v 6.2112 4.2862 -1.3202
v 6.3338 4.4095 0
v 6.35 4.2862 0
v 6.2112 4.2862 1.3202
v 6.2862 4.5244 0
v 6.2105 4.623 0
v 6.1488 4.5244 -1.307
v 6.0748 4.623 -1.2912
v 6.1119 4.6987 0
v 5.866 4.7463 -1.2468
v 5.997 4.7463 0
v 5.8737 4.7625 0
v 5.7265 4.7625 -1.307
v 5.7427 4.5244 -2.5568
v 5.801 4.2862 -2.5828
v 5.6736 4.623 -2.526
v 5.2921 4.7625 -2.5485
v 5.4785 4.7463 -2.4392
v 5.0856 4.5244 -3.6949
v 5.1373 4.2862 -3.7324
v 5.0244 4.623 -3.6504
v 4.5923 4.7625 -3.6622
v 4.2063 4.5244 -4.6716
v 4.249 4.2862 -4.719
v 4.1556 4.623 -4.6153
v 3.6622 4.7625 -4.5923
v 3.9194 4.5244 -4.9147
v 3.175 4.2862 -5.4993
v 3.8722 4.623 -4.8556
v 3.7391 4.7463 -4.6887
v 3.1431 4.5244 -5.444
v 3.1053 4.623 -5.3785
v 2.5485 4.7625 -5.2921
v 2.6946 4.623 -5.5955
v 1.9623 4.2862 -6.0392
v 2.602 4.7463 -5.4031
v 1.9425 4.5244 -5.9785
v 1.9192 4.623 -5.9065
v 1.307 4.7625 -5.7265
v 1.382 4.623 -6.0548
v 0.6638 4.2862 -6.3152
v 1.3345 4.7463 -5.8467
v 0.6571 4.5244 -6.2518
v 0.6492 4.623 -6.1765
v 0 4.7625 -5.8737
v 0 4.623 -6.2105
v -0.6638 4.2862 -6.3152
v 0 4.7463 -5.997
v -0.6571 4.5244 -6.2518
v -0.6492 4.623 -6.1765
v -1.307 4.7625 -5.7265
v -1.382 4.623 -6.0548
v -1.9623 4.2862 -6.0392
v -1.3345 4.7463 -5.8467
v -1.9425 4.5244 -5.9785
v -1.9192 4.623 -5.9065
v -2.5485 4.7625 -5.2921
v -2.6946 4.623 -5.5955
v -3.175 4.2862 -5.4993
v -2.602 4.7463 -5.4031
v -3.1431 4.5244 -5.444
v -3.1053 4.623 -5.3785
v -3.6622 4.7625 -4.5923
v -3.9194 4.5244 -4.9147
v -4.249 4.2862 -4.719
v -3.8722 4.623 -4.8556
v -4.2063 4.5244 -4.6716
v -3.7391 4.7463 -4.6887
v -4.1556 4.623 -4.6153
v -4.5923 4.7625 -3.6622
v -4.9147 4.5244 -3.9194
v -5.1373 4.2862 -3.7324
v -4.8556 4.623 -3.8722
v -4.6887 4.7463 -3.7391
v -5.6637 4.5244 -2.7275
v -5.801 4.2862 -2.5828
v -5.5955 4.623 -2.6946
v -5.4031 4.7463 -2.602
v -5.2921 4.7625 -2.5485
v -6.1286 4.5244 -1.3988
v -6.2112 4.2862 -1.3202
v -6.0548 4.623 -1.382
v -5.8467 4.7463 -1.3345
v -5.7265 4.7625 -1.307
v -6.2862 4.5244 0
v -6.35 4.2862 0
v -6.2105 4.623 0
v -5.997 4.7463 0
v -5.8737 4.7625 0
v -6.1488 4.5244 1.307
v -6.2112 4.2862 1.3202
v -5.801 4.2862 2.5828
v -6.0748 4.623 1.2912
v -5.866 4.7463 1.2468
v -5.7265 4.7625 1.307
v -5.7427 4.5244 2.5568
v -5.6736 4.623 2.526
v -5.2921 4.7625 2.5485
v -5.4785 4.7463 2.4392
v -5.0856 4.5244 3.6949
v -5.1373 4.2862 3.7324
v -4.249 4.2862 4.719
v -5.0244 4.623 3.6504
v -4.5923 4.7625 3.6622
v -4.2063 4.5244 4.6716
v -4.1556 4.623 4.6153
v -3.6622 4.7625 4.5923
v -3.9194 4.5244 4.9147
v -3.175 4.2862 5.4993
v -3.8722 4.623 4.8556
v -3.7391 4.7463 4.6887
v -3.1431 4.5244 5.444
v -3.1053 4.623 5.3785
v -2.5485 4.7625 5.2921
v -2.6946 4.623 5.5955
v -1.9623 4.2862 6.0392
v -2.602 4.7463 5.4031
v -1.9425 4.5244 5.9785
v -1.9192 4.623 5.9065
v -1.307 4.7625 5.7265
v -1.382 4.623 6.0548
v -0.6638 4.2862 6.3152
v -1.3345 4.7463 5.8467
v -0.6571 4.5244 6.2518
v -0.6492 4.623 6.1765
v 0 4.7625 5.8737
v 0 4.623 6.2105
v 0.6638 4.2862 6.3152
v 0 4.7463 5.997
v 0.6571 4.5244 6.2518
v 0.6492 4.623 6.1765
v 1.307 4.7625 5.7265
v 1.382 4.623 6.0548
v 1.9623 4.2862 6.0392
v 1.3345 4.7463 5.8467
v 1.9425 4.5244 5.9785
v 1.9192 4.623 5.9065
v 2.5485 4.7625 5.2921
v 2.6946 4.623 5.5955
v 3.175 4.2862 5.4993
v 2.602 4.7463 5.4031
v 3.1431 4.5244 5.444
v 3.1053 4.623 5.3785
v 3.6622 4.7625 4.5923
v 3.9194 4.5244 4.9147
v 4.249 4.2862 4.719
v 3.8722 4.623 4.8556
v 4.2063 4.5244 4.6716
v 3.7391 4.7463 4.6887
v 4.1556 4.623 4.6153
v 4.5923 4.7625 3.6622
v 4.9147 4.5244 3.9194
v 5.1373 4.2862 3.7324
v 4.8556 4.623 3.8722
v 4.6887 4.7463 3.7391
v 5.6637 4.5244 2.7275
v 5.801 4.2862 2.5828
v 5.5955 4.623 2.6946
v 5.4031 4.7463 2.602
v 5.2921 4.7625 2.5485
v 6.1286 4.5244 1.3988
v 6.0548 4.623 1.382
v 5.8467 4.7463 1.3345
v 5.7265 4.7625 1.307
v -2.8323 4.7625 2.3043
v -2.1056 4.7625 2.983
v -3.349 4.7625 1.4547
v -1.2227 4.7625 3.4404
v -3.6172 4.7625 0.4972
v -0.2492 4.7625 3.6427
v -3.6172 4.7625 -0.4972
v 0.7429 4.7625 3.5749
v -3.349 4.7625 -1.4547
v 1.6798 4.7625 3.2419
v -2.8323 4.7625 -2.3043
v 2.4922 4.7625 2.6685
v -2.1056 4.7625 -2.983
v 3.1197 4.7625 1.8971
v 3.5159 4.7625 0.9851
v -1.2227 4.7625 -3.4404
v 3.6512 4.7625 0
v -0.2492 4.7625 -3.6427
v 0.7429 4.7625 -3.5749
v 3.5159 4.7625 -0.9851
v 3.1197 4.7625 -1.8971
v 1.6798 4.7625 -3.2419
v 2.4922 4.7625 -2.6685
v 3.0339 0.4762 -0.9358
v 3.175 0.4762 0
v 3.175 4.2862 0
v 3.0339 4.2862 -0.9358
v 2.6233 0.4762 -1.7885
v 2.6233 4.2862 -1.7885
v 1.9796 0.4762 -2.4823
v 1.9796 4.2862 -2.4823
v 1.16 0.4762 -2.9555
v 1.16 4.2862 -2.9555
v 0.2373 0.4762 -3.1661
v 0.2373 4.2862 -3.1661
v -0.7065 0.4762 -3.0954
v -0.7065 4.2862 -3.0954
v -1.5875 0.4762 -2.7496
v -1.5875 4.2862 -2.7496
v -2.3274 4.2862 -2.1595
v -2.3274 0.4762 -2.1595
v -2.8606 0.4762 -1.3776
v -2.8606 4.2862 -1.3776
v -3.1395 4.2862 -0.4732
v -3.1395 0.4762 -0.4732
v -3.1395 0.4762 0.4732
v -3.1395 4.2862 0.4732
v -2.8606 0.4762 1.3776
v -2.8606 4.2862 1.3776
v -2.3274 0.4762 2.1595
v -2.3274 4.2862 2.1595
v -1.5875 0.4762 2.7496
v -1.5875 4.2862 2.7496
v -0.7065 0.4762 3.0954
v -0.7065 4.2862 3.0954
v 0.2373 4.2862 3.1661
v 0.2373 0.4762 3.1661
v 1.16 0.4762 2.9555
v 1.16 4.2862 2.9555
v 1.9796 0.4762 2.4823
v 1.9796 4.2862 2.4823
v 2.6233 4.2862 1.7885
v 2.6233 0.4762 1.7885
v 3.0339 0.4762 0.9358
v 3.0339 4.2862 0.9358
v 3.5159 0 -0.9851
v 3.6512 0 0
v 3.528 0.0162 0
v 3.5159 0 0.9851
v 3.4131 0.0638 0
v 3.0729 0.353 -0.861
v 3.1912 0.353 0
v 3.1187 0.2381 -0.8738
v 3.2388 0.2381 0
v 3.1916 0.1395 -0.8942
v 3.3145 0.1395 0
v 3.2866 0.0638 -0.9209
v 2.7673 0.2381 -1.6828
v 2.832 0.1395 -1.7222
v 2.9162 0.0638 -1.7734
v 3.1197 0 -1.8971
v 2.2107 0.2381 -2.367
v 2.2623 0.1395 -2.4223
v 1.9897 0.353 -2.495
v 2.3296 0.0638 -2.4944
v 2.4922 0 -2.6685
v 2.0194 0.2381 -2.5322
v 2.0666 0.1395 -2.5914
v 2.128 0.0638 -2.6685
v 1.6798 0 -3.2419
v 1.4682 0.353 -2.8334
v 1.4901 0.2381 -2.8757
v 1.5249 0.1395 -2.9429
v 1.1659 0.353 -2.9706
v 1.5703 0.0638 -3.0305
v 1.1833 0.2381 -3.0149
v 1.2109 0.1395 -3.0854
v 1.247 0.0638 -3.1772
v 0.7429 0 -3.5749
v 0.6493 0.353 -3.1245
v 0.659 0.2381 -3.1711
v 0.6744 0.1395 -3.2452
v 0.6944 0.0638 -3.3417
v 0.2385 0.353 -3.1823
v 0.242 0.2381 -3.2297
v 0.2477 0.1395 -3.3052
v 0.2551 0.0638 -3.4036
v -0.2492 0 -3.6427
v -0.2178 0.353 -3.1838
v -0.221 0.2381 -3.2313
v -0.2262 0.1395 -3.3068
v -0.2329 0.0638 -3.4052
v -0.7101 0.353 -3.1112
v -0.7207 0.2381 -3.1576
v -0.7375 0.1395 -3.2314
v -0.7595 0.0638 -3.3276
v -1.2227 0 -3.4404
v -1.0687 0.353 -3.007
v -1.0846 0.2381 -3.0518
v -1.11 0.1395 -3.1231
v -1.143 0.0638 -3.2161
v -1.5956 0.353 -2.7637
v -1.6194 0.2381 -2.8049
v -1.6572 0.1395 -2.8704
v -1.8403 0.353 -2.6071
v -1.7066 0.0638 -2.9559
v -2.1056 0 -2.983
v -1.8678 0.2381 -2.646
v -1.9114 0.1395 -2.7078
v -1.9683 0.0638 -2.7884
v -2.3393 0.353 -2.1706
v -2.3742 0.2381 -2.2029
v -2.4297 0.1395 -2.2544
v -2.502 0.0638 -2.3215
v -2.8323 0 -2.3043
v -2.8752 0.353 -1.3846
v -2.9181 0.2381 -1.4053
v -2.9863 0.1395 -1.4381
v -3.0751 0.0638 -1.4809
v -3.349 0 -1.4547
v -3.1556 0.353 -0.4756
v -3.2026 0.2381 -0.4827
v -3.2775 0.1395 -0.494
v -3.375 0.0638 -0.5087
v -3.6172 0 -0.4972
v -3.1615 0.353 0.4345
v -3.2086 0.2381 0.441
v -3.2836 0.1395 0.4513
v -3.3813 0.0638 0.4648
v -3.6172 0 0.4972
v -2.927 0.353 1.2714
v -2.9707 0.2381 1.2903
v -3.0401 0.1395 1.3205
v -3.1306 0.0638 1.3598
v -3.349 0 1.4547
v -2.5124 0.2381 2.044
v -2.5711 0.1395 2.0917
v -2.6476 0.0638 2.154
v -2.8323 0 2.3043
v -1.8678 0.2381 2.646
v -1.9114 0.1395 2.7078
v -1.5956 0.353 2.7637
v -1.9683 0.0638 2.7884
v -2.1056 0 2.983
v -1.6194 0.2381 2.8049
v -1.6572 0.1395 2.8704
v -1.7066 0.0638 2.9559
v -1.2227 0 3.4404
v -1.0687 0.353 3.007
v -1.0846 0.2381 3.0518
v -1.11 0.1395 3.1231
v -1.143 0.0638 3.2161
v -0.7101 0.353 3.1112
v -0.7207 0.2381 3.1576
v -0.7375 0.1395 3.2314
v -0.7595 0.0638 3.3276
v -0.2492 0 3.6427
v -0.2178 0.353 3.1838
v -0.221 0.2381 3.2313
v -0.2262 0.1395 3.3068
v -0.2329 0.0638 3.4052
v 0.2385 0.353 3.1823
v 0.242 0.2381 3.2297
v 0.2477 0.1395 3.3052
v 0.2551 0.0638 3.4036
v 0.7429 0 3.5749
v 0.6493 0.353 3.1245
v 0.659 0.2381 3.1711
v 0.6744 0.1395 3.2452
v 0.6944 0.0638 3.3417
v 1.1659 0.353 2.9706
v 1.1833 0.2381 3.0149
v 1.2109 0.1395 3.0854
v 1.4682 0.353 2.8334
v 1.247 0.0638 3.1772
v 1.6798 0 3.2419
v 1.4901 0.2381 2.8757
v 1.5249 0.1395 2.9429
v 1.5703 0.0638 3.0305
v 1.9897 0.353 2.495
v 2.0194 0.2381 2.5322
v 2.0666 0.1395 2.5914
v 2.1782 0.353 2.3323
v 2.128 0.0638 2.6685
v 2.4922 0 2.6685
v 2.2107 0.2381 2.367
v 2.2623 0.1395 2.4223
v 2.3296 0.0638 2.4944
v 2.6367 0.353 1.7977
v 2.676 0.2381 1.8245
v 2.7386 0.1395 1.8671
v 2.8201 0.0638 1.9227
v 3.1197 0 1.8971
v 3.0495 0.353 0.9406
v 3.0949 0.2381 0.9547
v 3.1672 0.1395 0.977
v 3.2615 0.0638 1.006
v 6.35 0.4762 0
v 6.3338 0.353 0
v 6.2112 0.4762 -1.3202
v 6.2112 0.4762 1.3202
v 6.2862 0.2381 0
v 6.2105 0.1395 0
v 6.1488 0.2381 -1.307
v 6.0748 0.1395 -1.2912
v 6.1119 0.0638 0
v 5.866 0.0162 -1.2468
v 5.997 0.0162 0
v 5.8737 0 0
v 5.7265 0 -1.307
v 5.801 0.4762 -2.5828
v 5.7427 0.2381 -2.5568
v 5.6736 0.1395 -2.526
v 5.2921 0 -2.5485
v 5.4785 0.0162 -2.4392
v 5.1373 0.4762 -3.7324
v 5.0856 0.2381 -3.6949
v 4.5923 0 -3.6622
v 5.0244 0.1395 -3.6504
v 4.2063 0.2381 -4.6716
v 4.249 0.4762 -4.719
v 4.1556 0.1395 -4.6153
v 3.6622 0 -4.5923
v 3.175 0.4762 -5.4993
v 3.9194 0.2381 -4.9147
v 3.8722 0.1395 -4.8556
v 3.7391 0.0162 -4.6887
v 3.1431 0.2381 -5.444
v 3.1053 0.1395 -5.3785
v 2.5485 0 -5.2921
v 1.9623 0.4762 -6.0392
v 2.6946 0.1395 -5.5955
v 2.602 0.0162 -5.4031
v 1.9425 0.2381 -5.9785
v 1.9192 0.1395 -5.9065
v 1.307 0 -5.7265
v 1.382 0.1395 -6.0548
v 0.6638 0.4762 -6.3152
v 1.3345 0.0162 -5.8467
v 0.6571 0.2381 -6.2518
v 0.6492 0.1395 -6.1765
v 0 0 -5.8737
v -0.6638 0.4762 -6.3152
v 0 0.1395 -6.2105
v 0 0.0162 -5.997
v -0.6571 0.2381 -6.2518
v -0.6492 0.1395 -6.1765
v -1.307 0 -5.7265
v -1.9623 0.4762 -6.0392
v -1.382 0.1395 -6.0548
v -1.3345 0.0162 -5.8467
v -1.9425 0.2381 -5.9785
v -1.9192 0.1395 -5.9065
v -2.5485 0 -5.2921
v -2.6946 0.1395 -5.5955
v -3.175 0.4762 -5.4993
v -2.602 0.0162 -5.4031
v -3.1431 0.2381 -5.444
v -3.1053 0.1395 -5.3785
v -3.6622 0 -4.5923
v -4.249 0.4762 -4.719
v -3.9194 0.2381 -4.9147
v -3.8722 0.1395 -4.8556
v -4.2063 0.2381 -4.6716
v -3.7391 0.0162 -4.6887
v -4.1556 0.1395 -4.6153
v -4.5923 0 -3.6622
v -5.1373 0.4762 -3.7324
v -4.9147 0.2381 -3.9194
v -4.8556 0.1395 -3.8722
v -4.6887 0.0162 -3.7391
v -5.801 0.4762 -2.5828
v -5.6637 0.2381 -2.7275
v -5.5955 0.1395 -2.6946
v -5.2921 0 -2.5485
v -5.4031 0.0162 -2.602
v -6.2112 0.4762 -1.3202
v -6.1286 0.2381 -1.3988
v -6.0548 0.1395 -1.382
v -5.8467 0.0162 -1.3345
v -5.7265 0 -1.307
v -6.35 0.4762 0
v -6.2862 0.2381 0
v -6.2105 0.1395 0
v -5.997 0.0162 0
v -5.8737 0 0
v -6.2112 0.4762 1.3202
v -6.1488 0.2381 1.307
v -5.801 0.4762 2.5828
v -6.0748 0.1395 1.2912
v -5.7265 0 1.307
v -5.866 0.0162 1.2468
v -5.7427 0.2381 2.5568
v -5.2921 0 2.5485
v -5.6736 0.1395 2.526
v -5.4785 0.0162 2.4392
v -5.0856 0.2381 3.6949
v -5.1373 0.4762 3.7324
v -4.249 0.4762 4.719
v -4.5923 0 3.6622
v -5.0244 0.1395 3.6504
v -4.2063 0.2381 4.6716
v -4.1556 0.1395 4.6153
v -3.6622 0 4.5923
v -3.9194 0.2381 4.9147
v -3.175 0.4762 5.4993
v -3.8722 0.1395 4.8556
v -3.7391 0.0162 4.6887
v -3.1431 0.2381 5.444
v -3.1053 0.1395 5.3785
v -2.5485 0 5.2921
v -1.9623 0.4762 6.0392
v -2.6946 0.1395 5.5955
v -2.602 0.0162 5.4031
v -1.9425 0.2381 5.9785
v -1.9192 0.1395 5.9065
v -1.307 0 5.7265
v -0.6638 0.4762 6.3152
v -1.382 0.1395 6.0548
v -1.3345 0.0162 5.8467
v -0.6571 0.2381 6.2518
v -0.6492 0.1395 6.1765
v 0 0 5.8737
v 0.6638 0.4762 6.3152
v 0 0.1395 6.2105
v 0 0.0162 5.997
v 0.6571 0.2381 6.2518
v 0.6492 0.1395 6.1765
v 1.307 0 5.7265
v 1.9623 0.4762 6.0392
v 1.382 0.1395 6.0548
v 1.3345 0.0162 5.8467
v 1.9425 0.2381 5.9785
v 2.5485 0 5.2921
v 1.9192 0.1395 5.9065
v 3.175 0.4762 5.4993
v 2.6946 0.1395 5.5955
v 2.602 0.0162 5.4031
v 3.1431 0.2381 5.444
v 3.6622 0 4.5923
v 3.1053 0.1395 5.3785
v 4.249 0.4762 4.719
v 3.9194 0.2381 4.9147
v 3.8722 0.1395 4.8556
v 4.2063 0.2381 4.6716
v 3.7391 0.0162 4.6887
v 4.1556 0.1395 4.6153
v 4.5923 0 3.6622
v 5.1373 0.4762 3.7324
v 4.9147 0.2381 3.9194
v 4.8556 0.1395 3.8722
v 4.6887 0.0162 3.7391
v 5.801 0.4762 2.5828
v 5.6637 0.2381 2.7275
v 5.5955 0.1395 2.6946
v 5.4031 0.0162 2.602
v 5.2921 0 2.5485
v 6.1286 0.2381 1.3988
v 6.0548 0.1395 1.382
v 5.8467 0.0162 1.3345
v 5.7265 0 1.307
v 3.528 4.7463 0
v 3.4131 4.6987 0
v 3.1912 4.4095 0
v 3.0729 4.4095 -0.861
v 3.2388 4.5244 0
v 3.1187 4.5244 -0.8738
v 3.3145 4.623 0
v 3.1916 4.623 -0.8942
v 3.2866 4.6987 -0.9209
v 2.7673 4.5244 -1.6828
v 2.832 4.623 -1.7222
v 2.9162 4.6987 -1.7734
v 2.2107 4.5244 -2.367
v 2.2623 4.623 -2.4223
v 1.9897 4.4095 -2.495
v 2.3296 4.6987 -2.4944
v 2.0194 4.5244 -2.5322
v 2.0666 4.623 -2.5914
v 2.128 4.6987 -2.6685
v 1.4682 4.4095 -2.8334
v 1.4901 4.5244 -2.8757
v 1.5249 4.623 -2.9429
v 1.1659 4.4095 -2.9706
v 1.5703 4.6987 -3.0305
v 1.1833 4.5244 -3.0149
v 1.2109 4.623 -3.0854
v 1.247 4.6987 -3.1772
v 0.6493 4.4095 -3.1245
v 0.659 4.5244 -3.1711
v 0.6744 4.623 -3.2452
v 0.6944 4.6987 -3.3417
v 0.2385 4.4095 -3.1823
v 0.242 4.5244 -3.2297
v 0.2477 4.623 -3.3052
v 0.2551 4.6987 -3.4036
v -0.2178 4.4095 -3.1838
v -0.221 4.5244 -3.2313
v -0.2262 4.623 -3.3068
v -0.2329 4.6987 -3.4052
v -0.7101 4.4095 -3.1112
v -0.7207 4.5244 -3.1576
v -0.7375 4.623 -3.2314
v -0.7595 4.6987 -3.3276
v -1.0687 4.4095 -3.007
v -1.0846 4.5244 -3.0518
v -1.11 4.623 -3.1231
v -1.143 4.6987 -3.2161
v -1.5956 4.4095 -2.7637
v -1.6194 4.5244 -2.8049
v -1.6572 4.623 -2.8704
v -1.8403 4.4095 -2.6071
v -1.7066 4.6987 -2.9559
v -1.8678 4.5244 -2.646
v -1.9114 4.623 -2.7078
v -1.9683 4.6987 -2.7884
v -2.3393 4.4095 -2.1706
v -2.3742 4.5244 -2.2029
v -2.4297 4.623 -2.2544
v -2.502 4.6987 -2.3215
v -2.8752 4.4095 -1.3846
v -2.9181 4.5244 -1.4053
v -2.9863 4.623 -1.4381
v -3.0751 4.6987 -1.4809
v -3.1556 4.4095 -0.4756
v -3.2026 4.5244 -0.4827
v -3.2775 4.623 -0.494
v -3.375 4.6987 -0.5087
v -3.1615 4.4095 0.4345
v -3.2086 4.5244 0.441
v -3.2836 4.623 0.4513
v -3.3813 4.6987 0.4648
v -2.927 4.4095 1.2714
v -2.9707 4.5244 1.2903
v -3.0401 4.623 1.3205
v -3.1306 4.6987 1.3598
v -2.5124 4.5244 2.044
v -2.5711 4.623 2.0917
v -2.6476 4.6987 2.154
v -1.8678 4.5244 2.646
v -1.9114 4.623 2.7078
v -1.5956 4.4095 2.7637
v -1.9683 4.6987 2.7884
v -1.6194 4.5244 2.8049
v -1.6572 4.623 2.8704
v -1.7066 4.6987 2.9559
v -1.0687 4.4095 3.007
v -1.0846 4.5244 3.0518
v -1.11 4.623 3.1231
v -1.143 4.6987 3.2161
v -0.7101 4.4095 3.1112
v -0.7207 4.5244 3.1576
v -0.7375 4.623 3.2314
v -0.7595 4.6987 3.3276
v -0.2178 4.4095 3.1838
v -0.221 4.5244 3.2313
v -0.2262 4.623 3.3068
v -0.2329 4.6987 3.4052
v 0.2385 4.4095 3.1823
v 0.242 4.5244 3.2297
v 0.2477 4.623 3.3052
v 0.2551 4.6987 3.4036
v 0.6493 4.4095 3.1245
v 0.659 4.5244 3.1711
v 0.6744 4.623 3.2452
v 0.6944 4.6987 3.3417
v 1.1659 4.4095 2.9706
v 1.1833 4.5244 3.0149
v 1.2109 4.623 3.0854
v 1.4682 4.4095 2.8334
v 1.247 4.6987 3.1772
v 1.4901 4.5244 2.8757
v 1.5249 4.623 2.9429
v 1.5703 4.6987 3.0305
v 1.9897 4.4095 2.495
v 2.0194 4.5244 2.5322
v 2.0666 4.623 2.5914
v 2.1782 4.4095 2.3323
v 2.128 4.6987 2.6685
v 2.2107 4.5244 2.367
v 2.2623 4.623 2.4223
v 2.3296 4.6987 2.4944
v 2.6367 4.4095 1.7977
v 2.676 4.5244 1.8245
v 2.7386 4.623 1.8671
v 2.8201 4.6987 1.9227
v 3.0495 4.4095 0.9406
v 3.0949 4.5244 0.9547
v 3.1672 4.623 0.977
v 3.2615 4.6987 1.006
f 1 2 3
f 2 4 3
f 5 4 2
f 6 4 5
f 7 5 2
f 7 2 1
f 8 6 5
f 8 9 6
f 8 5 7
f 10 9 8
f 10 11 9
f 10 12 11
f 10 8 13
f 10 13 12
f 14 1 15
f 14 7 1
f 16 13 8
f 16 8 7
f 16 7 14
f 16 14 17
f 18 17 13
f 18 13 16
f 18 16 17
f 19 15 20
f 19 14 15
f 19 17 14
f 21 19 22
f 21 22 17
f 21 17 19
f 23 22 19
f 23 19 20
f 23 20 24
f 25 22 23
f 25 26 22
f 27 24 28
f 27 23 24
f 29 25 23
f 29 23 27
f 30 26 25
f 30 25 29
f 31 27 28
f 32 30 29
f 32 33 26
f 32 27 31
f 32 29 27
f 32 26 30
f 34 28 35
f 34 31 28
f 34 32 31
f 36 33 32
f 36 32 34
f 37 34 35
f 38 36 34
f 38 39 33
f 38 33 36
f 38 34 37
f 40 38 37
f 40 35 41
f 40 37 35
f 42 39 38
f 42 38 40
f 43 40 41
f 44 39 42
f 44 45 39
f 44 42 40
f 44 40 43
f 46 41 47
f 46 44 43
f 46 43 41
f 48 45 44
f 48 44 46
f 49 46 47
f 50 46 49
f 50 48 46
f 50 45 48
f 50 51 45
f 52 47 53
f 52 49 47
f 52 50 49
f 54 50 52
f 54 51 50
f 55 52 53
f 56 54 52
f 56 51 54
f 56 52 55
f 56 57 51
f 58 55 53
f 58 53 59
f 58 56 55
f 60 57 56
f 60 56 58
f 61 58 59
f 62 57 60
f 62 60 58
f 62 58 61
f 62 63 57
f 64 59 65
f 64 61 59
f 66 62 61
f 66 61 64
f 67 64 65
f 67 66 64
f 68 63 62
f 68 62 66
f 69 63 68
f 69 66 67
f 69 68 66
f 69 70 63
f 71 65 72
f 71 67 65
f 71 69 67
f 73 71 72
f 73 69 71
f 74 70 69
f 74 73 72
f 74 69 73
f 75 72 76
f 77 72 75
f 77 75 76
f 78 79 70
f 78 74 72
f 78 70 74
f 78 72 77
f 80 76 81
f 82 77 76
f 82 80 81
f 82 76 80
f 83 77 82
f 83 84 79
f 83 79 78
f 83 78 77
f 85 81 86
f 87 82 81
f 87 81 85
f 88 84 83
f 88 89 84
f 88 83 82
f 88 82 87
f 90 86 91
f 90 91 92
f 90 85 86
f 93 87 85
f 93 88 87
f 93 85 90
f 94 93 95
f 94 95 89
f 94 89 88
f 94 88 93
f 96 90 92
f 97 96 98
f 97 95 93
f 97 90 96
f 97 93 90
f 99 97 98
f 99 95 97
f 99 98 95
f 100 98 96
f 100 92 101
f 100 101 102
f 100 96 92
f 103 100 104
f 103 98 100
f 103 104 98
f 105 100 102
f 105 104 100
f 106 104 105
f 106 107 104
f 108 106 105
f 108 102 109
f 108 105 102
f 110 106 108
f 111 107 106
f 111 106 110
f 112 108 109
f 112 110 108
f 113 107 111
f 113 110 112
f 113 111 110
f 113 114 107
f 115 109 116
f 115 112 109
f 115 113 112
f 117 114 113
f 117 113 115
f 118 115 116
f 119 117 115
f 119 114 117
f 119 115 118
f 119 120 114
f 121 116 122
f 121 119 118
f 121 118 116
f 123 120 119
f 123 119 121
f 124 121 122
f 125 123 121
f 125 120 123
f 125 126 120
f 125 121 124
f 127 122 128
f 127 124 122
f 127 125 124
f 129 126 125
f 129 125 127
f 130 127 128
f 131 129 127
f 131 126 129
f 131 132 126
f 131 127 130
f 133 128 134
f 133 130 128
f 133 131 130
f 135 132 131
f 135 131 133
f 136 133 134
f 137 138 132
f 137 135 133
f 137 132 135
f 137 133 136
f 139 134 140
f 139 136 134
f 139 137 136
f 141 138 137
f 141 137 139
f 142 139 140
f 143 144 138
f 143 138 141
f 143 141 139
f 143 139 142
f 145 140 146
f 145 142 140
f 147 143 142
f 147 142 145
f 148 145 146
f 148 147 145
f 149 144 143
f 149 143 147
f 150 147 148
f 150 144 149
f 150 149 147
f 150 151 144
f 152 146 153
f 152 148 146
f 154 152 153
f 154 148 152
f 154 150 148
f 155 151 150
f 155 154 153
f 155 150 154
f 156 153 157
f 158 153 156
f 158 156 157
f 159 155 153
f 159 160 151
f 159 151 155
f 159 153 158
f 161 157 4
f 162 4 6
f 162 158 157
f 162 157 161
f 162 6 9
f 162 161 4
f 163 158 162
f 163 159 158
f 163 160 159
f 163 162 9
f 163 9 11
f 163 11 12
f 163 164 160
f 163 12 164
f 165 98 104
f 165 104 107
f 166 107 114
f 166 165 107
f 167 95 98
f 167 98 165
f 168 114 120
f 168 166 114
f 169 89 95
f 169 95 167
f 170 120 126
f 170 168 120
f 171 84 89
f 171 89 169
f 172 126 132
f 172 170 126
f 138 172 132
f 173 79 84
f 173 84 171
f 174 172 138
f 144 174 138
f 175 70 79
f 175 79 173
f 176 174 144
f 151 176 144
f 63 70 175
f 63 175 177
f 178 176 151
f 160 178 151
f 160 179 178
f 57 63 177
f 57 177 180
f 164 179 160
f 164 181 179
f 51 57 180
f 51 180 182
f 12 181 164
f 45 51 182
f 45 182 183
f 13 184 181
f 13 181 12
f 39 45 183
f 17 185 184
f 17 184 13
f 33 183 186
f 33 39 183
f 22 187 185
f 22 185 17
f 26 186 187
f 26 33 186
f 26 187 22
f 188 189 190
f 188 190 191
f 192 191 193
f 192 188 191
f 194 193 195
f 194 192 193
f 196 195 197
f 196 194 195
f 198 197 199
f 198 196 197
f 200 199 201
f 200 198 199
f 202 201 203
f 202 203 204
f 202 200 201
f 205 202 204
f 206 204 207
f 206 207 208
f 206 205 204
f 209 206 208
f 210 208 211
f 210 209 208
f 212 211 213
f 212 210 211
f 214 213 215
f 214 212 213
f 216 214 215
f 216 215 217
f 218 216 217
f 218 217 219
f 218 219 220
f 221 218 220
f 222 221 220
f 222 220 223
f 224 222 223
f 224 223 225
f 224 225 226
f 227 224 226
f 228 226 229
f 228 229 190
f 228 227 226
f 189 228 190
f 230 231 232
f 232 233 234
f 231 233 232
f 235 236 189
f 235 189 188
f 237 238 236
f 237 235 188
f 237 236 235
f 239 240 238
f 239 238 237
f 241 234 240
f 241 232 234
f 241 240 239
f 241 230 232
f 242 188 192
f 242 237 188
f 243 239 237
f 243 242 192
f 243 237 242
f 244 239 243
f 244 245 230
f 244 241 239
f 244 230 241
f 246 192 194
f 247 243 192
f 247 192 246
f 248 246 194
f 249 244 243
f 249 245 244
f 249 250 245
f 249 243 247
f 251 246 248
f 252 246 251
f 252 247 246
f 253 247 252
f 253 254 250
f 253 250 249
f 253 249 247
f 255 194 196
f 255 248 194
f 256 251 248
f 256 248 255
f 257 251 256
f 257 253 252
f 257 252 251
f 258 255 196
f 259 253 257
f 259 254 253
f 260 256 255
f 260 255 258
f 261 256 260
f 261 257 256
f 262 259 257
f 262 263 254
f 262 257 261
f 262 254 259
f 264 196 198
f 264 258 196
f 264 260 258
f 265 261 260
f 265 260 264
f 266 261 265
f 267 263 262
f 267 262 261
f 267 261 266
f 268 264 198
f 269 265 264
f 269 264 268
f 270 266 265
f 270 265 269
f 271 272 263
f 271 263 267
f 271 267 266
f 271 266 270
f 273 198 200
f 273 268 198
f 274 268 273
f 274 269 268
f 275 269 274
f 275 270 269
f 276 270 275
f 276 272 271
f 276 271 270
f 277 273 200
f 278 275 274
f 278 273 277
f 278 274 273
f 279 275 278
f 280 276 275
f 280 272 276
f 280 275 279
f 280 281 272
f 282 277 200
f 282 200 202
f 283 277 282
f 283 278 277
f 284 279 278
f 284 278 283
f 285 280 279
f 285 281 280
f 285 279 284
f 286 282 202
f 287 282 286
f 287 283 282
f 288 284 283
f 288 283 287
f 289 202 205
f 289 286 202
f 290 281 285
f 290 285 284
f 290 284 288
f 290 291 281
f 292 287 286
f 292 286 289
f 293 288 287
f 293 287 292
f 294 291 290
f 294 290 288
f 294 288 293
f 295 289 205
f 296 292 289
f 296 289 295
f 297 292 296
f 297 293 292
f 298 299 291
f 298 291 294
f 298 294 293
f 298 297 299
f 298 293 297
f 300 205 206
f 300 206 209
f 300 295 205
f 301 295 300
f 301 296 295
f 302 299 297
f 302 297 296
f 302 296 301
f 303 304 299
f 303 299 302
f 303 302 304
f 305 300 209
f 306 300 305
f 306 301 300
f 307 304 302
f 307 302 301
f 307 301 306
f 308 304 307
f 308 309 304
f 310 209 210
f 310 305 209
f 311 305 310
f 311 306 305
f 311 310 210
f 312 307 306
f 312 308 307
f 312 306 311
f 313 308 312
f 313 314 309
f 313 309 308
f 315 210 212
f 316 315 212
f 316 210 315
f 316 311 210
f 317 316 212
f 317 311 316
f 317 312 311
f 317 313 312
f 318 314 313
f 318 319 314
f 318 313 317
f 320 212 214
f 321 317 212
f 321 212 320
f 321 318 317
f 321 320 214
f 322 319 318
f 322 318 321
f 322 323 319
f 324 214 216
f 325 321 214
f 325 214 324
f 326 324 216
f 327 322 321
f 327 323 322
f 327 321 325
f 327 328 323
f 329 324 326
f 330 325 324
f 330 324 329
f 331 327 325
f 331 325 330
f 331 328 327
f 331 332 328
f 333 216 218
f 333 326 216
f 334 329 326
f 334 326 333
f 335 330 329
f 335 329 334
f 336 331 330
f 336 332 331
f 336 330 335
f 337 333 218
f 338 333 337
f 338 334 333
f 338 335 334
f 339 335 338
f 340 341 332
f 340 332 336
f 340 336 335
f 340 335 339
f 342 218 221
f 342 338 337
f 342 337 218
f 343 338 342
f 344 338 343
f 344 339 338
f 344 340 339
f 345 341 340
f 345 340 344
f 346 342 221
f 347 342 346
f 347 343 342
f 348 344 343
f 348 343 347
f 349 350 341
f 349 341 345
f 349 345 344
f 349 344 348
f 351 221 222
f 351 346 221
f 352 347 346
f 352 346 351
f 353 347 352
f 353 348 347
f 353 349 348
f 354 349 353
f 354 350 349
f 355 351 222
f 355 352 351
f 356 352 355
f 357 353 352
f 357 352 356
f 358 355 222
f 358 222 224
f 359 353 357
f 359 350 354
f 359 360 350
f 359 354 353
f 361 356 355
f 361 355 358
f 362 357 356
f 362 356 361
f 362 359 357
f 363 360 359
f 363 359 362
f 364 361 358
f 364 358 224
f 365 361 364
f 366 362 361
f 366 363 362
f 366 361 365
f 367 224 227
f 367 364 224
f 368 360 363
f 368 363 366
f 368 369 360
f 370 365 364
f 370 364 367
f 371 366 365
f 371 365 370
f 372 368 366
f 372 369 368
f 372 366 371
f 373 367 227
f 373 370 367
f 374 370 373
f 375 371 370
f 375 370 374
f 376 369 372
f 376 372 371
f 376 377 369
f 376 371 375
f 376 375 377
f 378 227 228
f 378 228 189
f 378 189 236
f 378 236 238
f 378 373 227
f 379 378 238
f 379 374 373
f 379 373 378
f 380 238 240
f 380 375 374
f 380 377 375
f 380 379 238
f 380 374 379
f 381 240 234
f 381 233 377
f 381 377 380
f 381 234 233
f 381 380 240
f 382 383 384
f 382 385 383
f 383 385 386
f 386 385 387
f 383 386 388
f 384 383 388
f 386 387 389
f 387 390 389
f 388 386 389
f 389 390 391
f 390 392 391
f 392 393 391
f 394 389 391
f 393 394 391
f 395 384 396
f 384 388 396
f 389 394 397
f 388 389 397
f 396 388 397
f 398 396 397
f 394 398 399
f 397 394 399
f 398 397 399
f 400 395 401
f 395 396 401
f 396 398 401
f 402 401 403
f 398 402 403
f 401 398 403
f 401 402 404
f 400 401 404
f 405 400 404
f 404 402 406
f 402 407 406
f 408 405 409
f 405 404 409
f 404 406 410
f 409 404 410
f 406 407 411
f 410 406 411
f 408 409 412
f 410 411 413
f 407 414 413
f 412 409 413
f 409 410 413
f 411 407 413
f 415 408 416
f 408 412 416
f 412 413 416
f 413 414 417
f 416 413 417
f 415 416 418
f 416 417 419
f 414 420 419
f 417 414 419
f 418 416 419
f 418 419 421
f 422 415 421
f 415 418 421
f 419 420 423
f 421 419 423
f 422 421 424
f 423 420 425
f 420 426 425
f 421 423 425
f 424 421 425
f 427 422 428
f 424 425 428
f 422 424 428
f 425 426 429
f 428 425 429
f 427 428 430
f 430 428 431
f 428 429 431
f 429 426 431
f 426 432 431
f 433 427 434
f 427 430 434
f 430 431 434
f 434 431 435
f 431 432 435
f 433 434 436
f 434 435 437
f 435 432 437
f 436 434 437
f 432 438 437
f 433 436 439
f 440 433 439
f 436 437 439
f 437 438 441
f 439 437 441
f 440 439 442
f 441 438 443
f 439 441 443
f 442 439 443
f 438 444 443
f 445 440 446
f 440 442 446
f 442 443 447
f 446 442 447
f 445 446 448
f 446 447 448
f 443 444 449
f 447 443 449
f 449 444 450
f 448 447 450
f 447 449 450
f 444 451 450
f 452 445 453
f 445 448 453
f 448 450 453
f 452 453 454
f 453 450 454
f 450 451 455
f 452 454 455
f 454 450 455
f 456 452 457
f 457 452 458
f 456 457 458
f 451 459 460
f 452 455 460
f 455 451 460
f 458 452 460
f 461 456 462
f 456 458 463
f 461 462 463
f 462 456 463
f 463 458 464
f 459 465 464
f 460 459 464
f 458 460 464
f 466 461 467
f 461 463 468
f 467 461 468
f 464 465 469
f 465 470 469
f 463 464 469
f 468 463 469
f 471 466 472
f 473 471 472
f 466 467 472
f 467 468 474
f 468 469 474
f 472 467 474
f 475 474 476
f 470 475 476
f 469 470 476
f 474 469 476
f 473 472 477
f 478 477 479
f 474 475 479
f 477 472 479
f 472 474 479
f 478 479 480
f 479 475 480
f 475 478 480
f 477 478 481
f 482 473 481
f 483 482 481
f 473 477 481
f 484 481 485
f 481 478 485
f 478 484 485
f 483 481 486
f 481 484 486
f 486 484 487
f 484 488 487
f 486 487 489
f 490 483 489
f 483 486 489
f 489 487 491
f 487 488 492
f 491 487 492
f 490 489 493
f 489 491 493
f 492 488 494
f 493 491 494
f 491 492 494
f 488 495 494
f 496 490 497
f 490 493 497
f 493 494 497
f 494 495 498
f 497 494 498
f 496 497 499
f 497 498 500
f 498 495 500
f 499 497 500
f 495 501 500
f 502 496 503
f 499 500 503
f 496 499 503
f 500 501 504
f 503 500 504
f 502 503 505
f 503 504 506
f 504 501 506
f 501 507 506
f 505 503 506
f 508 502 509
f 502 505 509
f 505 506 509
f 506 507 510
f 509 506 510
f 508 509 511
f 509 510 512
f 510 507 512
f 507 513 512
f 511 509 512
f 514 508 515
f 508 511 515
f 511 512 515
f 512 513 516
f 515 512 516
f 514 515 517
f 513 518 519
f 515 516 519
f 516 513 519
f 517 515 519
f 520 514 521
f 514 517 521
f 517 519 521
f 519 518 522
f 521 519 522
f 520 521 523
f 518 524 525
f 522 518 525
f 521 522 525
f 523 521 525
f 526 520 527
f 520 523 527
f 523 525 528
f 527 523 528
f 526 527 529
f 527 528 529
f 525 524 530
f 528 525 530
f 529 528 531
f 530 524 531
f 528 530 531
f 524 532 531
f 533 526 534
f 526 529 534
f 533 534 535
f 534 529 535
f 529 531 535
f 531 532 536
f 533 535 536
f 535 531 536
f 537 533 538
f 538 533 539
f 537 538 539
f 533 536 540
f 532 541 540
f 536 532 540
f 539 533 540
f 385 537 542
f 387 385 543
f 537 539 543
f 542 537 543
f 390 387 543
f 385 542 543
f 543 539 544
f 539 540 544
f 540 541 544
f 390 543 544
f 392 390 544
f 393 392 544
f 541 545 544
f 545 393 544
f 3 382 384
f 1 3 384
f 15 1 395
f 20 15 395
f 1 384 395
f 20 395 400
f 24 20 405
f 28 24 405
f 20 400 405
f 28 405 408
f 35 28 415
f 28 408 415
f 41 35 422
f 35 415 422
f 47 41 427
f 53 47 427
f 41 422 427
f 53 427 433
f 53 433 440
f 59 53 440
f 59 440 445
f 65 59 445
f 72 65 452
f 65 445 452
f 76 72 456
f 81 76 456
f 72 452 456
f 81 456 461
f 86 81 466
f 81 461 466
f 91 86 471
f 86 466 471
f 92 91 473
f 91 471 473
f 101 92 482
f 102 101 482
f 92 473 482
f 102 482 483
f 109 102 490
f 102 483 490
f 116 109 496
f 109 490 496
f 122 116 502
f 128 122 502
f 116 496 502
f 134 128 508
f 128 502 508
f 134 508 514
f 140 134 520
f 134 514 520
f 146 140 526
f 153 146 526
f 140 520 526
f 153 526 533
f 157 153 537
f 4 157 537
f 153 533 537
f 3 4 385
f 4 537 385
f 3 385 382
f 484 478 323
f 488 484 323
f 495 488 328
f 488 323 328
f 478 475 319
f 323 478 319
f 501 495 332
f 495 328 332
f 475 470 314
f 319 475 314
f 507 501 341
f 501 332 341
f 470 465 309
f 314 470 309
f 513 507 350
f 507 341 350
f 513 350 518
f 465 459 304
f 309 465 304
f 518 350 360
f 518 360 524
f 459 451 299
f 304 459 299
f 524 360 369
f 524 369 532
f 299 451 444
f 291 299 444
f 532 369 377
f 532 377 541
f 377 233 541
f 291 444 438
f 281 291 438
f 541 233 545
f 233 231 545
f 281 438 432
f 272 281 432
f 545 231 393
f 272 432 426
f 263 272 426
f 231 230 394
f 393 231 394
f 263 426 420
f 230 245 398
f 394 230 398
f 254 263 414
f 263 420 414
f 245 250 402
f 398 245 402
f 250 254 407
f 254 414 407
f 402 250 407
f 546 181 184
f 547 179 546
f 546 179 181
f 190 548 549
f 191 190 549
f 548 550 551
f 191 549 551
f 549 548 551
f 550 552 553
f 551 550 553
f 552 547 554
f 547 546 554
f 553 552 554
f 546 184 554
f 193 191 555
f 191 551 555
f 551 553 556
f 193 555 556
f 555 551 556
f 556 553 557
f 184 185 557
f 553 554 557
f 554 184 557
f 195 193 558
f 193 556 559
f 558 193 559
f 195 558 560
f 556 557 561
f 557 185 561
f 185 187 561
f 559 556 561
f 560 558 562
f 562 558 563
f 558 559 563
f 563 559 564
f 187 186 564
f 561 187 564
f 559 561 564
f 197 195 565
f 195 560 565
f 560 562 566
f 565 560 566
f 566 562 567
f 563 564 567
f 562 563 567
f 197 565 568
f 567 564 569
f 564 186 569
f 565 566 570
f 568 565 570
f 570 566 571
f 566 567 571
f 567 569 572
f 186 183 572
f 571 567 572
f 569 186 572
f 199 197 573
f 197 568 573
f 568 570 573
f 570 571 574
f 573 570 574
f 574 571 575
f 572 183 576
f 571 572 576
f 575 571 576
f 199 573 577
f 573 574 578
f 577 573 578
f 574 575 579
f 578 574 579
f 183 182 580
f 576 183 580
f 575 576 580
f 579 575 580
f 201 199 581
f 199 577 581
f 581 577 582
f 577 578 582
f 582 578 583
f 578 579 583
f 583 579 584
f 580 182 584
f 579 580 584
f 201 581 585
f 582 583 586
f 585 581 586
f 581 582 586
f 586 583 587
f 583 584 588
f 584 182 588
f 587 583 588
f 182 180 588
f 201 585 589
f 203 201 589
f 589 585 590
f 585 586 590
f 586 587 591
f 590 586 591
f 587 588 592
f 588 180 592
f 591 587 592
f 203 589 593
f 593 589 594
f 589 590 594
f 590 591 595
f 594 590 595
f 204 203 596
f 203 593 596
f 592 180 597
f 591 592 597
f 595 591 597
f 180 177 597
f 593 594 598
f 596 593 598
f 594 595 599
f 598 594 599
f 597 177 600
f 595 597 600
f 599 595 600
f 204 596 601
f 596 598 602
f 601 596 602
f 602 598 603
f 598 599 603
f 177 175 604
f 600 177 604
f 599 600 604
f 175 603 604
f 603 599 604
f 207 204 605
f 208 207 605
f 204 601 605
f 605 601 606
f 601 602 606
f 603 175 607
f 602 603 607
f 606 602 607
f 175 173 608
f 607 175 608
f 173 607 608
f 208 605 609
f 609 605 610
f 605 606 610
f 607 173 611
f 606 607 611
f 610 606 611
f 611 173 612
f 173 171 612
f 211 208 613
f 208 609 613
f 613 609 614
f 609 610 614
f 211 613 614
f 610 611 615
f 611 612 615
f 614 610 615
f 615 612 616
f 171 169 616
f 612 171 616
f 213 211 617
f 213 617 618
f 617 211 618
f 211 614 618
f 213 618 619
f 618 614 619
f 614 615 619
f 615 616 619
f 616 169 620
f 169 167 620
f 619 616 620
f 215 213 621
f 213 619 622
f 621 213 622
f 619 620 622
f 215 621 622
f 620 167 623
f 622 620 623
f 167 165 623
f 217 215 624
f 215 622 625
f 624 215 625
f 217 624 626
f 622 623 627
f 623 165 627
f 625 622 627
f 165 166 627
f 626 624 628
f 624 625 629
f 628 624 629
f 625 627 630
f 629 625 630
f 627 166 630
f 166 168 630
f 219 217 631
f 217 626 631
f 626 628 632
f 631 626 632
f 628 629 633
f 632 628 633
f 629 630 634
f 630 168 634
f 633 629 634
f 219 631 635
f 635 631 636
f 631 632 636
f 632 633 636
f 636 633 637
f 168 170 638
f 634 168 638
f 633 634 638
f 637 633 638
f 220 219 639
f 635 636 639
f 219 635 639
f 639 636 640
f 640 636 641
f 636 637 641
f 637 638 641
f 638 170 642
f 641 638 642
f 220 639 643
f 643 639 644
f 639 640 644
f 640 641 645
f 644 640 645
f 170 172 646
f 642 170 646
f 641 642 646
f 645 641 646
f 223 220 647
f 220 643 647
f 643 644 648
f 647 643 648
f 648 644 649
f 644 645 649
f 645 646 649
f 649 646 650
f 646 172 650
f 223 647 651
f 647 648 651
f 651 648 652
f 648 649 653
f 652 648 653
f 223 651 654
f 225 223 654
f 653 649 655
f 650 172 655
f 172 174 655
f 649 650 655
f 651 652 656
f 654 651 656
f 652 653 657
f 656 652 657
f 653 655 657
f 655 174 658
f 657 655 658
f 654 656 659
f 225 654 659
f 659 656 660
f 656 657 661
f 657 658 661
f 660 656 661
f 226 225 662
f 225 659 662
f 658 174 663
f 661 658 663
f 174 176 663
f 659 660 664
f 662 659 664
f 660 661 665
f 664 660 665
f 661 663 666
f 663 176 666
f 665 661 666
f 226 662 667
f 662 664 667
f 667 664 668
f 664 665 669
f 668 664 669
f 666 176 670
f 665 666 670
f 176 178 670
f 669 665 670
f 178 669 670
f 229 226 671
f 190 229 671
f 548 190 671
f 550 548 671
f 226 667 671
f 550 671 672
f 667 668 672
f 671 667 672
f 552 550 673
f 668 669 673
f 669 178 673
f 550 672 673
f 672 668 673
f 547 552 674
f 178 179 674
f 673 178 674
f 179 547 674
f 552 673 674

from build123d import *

# Parameters (mm, degrees)
SKETCH1_R   = 6.35
SKETCH1_R_2 = 3.175
BORE_DEPTH  = 4.7625
FILLET_2_R  = 0.47625


with BuildPart() as part:
    # Sketch1 → Bore (new body)
    with BuildSketch(Plane(origin=(0, 0, 0), x_dir=(1, 0, 0), z_dir=(0, 1, 0))):
        Circle(SKETCH1_R)
        Circle(SKETCH1_R_2, mode=Mode.SUBTRACT)
    extrude(amount=BORE_DEPTH)

    # Fillet 2
    fillet_2_edges = [part.edges().sort_by_distance(p)[0] for p in [
        (-6.35, 0, 0),
        (-6.35, 4.7625, 0),
        (-3.175, 0, 0),
        (-3.175, 4.7625, 0),
    ]]
    fillet(fillet_2_edges, radius=FILLET_2_R)


solid = part.part
